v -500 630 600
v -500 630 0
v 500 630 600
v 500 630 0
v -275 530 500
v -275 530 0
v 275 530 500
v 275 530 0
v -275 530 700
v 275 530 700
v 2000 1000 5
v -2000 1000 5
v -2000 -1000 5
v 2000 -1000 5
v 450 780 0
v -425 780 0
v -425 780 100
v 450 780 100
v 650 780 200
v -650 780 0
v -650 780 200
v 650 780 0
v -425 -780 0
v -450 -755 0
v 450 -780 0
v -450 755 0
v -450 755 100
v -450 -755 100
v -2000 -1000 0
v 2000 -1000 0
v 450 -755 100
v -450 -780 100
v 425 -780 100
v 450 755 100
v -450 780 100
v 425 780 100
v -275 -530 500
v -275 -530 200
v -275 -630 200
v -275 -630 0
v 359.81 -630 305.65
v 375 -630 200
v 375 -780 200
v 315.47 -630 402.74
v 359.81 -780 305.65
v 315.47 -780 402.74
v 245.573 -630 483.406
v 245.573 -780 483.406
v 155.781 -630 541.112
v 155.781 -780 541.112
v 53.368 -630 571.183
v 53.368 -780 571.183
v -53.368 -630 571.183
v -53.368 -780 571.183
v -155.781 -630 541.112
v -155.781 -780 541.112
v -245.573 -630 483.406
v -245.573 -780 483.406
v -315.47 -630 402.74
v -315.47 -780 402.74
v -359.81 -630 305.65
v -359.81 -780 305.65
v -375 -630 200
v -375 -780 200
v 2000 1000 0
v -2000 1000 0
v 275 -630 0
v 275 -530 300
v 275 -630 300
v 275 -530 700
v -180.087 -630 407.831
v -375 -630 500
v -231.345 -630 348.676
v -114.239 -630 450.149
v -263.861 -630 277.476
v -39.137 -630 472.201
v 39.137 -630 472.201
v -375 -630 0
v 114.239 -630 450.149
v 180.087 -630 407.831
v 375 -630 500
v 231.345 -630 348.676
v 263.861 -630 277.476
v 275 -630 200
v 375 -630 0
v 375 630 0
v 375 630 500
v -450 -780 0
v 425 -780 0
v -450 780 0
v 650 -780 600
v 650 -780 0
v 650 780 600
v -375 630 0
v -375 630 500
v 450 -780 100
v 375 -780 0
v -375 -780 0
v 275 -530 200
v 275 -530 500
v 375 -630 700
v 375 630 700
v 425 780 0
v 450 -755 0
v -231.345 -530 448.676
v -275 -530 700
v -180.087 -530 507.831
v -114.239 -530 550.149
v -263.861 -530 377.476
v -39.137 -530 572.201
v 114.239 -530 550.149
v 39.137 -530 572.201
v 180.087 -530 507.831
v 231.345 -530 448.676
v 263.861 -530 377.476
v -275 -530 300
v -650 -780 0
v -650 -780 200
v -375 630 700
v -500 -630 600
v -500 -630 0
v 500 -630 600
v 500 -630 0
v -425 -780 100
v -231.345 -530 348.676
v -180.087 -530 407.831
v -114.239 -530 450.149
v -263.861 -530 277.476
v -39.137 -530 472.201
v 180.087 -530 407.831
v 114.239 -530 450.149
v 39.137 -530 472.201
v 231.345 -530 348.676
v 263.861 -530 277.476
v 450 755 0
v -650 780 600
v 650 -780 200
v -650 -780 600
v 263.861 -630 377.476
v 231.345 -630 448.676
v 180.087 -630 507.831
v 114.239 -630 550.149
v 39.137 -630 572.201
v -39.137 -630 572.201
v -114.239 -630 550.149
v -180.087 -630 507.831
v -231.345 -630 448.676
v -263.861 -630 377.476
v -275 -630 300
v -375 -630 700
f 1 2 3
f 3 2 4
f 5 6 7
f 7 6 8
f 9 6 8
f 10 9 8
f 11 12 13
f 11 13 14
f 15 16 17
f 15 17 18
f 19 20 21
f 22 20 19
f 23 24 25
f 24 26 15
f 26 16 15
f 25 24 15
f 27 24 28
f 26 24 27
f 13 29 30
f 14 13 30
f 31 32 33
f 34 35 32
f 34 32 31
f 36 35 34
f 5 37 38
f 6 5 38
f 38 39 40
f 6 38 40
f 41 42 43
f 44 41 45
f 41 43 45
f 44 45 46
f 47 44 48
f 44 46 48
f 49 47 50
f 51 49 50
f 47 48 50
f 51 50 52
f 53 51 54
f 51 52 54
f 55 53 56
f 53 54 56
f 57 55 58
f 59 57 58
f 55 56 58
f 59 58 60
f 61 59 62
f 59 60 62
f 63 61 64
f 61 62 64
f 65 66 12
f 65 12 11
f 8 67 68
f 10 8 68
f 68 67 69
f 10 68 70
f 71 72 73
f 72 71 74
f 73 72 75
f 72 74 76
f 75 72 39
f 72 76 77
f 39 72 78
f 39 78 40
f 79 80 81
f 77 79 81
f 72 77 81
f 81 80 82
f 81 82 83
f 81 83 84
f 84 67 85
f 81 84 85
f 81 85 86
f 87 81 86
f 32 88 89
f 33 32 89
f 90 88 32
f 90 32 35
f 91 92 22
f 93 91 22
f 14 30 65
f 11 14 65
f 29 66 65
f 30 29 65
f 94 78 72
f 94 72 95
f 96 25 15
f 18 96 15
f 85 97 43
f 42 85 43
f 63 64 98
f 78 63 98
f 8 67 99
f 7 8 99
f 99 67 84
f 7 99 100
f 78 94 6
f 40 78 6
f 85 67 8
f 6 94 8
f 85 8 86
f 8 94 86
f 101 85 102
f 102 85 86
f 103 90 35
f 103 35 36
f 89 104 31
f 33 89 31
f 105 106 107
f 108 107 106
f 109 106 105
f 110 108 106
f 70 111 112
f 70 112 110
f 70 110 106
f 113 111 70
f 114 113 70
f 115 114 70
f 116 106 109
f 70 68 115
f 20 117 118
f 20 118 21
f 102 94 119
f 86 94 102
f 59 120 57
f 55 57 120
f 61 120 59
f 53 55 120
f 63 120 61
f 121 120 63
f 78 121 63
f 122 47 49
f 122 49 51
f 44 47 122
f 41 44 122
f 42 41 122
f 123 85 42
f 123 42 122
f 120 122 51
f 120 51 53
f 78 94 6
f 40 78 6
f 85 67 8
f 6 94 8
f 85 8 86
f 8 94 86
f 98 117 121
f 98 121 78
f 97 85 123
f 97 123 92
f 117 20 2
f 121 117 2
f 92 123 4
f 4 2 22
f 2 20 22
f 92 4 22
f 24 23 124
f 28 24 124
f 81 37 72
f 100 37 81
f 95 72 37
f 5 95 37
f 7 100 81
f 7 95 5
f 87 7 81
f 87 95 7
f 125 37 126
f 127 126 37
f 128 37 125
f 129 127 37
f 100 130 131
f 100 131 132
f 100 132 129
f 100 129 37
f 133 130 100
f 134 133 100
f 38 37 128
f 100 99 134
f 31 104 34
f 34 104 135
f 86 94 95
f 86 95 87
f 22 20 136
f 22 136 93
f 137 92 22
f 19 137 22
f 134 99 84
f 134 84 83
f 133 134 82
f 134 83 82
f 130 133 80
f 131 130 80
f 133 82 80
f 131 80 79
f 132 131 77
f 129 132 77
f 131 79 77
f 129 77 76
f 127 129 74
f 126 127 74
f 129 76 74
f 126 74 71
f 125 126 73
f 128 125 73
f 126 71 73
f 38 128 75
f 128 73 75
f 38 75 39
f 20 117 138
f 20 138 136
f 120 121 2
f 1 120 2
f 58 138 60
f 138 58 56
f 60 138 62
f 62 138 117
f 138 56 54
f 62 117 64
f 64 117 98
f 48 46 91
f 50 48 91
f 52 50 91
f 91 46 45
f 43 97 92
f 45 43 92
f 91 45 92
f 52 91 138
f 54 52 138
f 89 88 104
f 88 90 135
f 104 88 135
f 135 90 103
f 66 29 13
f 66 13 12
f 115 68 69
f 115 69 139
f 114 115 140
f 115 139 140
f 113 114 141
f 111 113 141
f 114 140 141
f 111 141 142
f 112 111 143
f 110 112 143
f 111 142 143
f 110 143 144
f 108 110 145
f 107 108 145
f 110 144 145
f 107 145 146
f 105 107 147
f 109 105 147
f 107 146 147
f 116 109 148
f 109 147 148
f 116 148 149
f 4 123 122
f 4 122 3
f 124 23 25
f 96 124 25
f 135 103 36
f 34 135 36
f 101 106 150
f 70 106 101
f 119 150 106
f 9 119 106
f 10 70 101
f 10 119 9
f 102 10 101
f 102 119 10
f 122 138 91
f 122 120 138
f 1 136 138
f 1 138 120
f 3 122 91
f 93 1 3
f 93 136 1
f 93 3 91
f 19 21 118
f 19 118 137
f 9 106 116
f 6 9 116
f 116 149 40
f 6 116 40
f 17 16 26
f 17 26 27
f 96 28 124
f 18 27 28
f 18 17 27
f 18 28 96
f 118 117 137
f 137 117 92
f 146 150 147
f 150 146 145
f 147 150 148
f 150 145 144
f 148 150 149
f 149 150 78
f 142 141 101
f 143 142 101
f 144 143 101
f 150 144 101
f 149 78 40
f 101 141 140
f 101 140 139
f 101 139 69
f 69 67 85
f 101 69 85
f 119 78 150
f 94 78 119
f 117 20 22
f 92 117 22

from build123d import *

# Parameters (mm, degrees)
F0_W      = 1300
F0_H      = 1560
F1_DEPTH  = 200
F2_W      = 1300
F2_H      = 1560
F2_W_2    = 1000
F2_H_2    = 1260
F3_DEPTH  = 600
F5_DEPTH  = 150
F6_W      = 750
F6_H      = 1260
F6_W_2    = 550
F6_H_2    = 1060
F7_DEPTH  = 700
F9_DEPTH  = 100
F10_W     = 900
F10_H     = 1560
F11_DEPTH = 100
F12_SIZE  = 25
F13_W     = 750
F13_H     = 1260
F13_W_2   = 550
F13_H_2   = 1060
F14_DEPTH = 500
F16_DEPTH = 100
F17_W     = 900
F17_H     = 1560
F18_DEPTH = 100
F19_SIZE  = 25
F20_W     = 4000
F20_H     = 2000
F21_DEPTH = 5


with BuildPart() as f1:
    # F0 (on Top) → F1 (new body)
    with BuildSketch(Plane.XY):
        Rectangle(F0_W, F0_H)
    extrude(amount=F1_DEPTH)


with BuildPart() as f3:
    # F2 (on Top) → F3 (new body)
    with BuildSketch(Plane.XY):
        Rectangle(F2_W, F2_H)
        Rectangle(F2_W_2, F2_H_2, mode=Mode.SUBTRACT)
    extrude(amount=F3_DEPTH)

    # F4 (on face) → F5 (cut, through all)
    with BuildSketch(Plane.XZ.offset(780)):
        with BuildLine():
            Line((-375, 200), (-375, 0))
            Line((-375, 0), (375, 0))
            Line((375, 0), (375, 200))
            ThreePointArc((375, 200), (0, 575), (-375, 200))
        make_face()
    extrude(amount=-F5_DEPTH, mode=Mode.SUBTRACT)


with BuildPart() as f7:
    # F6 (on Top) → F7 (new body)
    with BuildSketch(Plane.XY):
        Rectangle(F6_W, F6_H)
        Rectangle(F6_W_2, F6_H_2, mode=Mode.SUBTRACT)
    extrude(amount=F7_DEPTH)

    # F8 (on face) → F9 (cut, through all)
    with BuildSketch(Plane.XZ.offset(630)):
        with BuildLine():
            Line((-275, 300), (-275, 0))
            Line((-275, 0), (275, 0))
            Line((275, 0), (275, 300))
            ThreePointArc((275, 300), (0, 575), (-275, 300))
        make_face()
    extrude(amount=-F9_DEPTH, mode=Mode.SUBTRACT)


with BuildPart() as f11:
    # F10 (on Top) → F11 (new body)
    with BuildSketch(Plane.XY):
        Rectangle(F10_W, F10_H)
    extrude(amount=F11_DEPTH)

    # F12
    f12_edges = [f11.edges().sort_by_distance(p)[0] for p in [
        (450, -780, 50),
        (450, 780, 50),
    ]]
    chamfer(f12_edges, length=F12_SIZE)


with BuildPart() as f14:
    # F13 (on Top) → F14 (new body)
    with BuildSketch(Plane.XY):
        Rectangle(F13_W, F13_H)
        Rectangle(F13_W_2, F13_H_2, mode=Mode.SUBTRACT)
    extrude(amount=F14_DEPTH)

    # F15 (on face) → F16 (cut, through all)
    with BuildSketch(Plane.XZ.offset(630)):
        with BuildLine():
            Line((-275, 200), (-275, 0))
            Line((-275, 0), (275, 0))
            Line((275, 0), (275, 200))
            ThreePointArc((275, 200), (0, 475), (-275, 200))
        make_face()
    extrude(amount=-F16_DEPTH, mode=Mode.SUBTRACT)


with BuildPart() as f18:
    # F17 (on Top) → F18 (new body)
    with BuildSketch(Plane.XY):
        Rectangle(F17_W, F17_H)
    extrude(amount=F18_DEPTH)

    # F19
    f19_edges = [f18.edges().sort_by_distance(p)[0] for p in [
        (-450, -780, 50),
        (-450, 780, 50),
    ]]
    chamfer(f19_edges, length=F19_SIZE)


with BuildPart() as f21:
    # F20 (on Top) → F21 (new body)
    with BuildSketch(Plane.XY):
        Rectangle(F20_W, F20_H)
    extrude(amount=F21_DEPTH)


solid = Compound([f1.part, f3.part, f7.part, f11.part, f14.part, f18.part, f21.part])
